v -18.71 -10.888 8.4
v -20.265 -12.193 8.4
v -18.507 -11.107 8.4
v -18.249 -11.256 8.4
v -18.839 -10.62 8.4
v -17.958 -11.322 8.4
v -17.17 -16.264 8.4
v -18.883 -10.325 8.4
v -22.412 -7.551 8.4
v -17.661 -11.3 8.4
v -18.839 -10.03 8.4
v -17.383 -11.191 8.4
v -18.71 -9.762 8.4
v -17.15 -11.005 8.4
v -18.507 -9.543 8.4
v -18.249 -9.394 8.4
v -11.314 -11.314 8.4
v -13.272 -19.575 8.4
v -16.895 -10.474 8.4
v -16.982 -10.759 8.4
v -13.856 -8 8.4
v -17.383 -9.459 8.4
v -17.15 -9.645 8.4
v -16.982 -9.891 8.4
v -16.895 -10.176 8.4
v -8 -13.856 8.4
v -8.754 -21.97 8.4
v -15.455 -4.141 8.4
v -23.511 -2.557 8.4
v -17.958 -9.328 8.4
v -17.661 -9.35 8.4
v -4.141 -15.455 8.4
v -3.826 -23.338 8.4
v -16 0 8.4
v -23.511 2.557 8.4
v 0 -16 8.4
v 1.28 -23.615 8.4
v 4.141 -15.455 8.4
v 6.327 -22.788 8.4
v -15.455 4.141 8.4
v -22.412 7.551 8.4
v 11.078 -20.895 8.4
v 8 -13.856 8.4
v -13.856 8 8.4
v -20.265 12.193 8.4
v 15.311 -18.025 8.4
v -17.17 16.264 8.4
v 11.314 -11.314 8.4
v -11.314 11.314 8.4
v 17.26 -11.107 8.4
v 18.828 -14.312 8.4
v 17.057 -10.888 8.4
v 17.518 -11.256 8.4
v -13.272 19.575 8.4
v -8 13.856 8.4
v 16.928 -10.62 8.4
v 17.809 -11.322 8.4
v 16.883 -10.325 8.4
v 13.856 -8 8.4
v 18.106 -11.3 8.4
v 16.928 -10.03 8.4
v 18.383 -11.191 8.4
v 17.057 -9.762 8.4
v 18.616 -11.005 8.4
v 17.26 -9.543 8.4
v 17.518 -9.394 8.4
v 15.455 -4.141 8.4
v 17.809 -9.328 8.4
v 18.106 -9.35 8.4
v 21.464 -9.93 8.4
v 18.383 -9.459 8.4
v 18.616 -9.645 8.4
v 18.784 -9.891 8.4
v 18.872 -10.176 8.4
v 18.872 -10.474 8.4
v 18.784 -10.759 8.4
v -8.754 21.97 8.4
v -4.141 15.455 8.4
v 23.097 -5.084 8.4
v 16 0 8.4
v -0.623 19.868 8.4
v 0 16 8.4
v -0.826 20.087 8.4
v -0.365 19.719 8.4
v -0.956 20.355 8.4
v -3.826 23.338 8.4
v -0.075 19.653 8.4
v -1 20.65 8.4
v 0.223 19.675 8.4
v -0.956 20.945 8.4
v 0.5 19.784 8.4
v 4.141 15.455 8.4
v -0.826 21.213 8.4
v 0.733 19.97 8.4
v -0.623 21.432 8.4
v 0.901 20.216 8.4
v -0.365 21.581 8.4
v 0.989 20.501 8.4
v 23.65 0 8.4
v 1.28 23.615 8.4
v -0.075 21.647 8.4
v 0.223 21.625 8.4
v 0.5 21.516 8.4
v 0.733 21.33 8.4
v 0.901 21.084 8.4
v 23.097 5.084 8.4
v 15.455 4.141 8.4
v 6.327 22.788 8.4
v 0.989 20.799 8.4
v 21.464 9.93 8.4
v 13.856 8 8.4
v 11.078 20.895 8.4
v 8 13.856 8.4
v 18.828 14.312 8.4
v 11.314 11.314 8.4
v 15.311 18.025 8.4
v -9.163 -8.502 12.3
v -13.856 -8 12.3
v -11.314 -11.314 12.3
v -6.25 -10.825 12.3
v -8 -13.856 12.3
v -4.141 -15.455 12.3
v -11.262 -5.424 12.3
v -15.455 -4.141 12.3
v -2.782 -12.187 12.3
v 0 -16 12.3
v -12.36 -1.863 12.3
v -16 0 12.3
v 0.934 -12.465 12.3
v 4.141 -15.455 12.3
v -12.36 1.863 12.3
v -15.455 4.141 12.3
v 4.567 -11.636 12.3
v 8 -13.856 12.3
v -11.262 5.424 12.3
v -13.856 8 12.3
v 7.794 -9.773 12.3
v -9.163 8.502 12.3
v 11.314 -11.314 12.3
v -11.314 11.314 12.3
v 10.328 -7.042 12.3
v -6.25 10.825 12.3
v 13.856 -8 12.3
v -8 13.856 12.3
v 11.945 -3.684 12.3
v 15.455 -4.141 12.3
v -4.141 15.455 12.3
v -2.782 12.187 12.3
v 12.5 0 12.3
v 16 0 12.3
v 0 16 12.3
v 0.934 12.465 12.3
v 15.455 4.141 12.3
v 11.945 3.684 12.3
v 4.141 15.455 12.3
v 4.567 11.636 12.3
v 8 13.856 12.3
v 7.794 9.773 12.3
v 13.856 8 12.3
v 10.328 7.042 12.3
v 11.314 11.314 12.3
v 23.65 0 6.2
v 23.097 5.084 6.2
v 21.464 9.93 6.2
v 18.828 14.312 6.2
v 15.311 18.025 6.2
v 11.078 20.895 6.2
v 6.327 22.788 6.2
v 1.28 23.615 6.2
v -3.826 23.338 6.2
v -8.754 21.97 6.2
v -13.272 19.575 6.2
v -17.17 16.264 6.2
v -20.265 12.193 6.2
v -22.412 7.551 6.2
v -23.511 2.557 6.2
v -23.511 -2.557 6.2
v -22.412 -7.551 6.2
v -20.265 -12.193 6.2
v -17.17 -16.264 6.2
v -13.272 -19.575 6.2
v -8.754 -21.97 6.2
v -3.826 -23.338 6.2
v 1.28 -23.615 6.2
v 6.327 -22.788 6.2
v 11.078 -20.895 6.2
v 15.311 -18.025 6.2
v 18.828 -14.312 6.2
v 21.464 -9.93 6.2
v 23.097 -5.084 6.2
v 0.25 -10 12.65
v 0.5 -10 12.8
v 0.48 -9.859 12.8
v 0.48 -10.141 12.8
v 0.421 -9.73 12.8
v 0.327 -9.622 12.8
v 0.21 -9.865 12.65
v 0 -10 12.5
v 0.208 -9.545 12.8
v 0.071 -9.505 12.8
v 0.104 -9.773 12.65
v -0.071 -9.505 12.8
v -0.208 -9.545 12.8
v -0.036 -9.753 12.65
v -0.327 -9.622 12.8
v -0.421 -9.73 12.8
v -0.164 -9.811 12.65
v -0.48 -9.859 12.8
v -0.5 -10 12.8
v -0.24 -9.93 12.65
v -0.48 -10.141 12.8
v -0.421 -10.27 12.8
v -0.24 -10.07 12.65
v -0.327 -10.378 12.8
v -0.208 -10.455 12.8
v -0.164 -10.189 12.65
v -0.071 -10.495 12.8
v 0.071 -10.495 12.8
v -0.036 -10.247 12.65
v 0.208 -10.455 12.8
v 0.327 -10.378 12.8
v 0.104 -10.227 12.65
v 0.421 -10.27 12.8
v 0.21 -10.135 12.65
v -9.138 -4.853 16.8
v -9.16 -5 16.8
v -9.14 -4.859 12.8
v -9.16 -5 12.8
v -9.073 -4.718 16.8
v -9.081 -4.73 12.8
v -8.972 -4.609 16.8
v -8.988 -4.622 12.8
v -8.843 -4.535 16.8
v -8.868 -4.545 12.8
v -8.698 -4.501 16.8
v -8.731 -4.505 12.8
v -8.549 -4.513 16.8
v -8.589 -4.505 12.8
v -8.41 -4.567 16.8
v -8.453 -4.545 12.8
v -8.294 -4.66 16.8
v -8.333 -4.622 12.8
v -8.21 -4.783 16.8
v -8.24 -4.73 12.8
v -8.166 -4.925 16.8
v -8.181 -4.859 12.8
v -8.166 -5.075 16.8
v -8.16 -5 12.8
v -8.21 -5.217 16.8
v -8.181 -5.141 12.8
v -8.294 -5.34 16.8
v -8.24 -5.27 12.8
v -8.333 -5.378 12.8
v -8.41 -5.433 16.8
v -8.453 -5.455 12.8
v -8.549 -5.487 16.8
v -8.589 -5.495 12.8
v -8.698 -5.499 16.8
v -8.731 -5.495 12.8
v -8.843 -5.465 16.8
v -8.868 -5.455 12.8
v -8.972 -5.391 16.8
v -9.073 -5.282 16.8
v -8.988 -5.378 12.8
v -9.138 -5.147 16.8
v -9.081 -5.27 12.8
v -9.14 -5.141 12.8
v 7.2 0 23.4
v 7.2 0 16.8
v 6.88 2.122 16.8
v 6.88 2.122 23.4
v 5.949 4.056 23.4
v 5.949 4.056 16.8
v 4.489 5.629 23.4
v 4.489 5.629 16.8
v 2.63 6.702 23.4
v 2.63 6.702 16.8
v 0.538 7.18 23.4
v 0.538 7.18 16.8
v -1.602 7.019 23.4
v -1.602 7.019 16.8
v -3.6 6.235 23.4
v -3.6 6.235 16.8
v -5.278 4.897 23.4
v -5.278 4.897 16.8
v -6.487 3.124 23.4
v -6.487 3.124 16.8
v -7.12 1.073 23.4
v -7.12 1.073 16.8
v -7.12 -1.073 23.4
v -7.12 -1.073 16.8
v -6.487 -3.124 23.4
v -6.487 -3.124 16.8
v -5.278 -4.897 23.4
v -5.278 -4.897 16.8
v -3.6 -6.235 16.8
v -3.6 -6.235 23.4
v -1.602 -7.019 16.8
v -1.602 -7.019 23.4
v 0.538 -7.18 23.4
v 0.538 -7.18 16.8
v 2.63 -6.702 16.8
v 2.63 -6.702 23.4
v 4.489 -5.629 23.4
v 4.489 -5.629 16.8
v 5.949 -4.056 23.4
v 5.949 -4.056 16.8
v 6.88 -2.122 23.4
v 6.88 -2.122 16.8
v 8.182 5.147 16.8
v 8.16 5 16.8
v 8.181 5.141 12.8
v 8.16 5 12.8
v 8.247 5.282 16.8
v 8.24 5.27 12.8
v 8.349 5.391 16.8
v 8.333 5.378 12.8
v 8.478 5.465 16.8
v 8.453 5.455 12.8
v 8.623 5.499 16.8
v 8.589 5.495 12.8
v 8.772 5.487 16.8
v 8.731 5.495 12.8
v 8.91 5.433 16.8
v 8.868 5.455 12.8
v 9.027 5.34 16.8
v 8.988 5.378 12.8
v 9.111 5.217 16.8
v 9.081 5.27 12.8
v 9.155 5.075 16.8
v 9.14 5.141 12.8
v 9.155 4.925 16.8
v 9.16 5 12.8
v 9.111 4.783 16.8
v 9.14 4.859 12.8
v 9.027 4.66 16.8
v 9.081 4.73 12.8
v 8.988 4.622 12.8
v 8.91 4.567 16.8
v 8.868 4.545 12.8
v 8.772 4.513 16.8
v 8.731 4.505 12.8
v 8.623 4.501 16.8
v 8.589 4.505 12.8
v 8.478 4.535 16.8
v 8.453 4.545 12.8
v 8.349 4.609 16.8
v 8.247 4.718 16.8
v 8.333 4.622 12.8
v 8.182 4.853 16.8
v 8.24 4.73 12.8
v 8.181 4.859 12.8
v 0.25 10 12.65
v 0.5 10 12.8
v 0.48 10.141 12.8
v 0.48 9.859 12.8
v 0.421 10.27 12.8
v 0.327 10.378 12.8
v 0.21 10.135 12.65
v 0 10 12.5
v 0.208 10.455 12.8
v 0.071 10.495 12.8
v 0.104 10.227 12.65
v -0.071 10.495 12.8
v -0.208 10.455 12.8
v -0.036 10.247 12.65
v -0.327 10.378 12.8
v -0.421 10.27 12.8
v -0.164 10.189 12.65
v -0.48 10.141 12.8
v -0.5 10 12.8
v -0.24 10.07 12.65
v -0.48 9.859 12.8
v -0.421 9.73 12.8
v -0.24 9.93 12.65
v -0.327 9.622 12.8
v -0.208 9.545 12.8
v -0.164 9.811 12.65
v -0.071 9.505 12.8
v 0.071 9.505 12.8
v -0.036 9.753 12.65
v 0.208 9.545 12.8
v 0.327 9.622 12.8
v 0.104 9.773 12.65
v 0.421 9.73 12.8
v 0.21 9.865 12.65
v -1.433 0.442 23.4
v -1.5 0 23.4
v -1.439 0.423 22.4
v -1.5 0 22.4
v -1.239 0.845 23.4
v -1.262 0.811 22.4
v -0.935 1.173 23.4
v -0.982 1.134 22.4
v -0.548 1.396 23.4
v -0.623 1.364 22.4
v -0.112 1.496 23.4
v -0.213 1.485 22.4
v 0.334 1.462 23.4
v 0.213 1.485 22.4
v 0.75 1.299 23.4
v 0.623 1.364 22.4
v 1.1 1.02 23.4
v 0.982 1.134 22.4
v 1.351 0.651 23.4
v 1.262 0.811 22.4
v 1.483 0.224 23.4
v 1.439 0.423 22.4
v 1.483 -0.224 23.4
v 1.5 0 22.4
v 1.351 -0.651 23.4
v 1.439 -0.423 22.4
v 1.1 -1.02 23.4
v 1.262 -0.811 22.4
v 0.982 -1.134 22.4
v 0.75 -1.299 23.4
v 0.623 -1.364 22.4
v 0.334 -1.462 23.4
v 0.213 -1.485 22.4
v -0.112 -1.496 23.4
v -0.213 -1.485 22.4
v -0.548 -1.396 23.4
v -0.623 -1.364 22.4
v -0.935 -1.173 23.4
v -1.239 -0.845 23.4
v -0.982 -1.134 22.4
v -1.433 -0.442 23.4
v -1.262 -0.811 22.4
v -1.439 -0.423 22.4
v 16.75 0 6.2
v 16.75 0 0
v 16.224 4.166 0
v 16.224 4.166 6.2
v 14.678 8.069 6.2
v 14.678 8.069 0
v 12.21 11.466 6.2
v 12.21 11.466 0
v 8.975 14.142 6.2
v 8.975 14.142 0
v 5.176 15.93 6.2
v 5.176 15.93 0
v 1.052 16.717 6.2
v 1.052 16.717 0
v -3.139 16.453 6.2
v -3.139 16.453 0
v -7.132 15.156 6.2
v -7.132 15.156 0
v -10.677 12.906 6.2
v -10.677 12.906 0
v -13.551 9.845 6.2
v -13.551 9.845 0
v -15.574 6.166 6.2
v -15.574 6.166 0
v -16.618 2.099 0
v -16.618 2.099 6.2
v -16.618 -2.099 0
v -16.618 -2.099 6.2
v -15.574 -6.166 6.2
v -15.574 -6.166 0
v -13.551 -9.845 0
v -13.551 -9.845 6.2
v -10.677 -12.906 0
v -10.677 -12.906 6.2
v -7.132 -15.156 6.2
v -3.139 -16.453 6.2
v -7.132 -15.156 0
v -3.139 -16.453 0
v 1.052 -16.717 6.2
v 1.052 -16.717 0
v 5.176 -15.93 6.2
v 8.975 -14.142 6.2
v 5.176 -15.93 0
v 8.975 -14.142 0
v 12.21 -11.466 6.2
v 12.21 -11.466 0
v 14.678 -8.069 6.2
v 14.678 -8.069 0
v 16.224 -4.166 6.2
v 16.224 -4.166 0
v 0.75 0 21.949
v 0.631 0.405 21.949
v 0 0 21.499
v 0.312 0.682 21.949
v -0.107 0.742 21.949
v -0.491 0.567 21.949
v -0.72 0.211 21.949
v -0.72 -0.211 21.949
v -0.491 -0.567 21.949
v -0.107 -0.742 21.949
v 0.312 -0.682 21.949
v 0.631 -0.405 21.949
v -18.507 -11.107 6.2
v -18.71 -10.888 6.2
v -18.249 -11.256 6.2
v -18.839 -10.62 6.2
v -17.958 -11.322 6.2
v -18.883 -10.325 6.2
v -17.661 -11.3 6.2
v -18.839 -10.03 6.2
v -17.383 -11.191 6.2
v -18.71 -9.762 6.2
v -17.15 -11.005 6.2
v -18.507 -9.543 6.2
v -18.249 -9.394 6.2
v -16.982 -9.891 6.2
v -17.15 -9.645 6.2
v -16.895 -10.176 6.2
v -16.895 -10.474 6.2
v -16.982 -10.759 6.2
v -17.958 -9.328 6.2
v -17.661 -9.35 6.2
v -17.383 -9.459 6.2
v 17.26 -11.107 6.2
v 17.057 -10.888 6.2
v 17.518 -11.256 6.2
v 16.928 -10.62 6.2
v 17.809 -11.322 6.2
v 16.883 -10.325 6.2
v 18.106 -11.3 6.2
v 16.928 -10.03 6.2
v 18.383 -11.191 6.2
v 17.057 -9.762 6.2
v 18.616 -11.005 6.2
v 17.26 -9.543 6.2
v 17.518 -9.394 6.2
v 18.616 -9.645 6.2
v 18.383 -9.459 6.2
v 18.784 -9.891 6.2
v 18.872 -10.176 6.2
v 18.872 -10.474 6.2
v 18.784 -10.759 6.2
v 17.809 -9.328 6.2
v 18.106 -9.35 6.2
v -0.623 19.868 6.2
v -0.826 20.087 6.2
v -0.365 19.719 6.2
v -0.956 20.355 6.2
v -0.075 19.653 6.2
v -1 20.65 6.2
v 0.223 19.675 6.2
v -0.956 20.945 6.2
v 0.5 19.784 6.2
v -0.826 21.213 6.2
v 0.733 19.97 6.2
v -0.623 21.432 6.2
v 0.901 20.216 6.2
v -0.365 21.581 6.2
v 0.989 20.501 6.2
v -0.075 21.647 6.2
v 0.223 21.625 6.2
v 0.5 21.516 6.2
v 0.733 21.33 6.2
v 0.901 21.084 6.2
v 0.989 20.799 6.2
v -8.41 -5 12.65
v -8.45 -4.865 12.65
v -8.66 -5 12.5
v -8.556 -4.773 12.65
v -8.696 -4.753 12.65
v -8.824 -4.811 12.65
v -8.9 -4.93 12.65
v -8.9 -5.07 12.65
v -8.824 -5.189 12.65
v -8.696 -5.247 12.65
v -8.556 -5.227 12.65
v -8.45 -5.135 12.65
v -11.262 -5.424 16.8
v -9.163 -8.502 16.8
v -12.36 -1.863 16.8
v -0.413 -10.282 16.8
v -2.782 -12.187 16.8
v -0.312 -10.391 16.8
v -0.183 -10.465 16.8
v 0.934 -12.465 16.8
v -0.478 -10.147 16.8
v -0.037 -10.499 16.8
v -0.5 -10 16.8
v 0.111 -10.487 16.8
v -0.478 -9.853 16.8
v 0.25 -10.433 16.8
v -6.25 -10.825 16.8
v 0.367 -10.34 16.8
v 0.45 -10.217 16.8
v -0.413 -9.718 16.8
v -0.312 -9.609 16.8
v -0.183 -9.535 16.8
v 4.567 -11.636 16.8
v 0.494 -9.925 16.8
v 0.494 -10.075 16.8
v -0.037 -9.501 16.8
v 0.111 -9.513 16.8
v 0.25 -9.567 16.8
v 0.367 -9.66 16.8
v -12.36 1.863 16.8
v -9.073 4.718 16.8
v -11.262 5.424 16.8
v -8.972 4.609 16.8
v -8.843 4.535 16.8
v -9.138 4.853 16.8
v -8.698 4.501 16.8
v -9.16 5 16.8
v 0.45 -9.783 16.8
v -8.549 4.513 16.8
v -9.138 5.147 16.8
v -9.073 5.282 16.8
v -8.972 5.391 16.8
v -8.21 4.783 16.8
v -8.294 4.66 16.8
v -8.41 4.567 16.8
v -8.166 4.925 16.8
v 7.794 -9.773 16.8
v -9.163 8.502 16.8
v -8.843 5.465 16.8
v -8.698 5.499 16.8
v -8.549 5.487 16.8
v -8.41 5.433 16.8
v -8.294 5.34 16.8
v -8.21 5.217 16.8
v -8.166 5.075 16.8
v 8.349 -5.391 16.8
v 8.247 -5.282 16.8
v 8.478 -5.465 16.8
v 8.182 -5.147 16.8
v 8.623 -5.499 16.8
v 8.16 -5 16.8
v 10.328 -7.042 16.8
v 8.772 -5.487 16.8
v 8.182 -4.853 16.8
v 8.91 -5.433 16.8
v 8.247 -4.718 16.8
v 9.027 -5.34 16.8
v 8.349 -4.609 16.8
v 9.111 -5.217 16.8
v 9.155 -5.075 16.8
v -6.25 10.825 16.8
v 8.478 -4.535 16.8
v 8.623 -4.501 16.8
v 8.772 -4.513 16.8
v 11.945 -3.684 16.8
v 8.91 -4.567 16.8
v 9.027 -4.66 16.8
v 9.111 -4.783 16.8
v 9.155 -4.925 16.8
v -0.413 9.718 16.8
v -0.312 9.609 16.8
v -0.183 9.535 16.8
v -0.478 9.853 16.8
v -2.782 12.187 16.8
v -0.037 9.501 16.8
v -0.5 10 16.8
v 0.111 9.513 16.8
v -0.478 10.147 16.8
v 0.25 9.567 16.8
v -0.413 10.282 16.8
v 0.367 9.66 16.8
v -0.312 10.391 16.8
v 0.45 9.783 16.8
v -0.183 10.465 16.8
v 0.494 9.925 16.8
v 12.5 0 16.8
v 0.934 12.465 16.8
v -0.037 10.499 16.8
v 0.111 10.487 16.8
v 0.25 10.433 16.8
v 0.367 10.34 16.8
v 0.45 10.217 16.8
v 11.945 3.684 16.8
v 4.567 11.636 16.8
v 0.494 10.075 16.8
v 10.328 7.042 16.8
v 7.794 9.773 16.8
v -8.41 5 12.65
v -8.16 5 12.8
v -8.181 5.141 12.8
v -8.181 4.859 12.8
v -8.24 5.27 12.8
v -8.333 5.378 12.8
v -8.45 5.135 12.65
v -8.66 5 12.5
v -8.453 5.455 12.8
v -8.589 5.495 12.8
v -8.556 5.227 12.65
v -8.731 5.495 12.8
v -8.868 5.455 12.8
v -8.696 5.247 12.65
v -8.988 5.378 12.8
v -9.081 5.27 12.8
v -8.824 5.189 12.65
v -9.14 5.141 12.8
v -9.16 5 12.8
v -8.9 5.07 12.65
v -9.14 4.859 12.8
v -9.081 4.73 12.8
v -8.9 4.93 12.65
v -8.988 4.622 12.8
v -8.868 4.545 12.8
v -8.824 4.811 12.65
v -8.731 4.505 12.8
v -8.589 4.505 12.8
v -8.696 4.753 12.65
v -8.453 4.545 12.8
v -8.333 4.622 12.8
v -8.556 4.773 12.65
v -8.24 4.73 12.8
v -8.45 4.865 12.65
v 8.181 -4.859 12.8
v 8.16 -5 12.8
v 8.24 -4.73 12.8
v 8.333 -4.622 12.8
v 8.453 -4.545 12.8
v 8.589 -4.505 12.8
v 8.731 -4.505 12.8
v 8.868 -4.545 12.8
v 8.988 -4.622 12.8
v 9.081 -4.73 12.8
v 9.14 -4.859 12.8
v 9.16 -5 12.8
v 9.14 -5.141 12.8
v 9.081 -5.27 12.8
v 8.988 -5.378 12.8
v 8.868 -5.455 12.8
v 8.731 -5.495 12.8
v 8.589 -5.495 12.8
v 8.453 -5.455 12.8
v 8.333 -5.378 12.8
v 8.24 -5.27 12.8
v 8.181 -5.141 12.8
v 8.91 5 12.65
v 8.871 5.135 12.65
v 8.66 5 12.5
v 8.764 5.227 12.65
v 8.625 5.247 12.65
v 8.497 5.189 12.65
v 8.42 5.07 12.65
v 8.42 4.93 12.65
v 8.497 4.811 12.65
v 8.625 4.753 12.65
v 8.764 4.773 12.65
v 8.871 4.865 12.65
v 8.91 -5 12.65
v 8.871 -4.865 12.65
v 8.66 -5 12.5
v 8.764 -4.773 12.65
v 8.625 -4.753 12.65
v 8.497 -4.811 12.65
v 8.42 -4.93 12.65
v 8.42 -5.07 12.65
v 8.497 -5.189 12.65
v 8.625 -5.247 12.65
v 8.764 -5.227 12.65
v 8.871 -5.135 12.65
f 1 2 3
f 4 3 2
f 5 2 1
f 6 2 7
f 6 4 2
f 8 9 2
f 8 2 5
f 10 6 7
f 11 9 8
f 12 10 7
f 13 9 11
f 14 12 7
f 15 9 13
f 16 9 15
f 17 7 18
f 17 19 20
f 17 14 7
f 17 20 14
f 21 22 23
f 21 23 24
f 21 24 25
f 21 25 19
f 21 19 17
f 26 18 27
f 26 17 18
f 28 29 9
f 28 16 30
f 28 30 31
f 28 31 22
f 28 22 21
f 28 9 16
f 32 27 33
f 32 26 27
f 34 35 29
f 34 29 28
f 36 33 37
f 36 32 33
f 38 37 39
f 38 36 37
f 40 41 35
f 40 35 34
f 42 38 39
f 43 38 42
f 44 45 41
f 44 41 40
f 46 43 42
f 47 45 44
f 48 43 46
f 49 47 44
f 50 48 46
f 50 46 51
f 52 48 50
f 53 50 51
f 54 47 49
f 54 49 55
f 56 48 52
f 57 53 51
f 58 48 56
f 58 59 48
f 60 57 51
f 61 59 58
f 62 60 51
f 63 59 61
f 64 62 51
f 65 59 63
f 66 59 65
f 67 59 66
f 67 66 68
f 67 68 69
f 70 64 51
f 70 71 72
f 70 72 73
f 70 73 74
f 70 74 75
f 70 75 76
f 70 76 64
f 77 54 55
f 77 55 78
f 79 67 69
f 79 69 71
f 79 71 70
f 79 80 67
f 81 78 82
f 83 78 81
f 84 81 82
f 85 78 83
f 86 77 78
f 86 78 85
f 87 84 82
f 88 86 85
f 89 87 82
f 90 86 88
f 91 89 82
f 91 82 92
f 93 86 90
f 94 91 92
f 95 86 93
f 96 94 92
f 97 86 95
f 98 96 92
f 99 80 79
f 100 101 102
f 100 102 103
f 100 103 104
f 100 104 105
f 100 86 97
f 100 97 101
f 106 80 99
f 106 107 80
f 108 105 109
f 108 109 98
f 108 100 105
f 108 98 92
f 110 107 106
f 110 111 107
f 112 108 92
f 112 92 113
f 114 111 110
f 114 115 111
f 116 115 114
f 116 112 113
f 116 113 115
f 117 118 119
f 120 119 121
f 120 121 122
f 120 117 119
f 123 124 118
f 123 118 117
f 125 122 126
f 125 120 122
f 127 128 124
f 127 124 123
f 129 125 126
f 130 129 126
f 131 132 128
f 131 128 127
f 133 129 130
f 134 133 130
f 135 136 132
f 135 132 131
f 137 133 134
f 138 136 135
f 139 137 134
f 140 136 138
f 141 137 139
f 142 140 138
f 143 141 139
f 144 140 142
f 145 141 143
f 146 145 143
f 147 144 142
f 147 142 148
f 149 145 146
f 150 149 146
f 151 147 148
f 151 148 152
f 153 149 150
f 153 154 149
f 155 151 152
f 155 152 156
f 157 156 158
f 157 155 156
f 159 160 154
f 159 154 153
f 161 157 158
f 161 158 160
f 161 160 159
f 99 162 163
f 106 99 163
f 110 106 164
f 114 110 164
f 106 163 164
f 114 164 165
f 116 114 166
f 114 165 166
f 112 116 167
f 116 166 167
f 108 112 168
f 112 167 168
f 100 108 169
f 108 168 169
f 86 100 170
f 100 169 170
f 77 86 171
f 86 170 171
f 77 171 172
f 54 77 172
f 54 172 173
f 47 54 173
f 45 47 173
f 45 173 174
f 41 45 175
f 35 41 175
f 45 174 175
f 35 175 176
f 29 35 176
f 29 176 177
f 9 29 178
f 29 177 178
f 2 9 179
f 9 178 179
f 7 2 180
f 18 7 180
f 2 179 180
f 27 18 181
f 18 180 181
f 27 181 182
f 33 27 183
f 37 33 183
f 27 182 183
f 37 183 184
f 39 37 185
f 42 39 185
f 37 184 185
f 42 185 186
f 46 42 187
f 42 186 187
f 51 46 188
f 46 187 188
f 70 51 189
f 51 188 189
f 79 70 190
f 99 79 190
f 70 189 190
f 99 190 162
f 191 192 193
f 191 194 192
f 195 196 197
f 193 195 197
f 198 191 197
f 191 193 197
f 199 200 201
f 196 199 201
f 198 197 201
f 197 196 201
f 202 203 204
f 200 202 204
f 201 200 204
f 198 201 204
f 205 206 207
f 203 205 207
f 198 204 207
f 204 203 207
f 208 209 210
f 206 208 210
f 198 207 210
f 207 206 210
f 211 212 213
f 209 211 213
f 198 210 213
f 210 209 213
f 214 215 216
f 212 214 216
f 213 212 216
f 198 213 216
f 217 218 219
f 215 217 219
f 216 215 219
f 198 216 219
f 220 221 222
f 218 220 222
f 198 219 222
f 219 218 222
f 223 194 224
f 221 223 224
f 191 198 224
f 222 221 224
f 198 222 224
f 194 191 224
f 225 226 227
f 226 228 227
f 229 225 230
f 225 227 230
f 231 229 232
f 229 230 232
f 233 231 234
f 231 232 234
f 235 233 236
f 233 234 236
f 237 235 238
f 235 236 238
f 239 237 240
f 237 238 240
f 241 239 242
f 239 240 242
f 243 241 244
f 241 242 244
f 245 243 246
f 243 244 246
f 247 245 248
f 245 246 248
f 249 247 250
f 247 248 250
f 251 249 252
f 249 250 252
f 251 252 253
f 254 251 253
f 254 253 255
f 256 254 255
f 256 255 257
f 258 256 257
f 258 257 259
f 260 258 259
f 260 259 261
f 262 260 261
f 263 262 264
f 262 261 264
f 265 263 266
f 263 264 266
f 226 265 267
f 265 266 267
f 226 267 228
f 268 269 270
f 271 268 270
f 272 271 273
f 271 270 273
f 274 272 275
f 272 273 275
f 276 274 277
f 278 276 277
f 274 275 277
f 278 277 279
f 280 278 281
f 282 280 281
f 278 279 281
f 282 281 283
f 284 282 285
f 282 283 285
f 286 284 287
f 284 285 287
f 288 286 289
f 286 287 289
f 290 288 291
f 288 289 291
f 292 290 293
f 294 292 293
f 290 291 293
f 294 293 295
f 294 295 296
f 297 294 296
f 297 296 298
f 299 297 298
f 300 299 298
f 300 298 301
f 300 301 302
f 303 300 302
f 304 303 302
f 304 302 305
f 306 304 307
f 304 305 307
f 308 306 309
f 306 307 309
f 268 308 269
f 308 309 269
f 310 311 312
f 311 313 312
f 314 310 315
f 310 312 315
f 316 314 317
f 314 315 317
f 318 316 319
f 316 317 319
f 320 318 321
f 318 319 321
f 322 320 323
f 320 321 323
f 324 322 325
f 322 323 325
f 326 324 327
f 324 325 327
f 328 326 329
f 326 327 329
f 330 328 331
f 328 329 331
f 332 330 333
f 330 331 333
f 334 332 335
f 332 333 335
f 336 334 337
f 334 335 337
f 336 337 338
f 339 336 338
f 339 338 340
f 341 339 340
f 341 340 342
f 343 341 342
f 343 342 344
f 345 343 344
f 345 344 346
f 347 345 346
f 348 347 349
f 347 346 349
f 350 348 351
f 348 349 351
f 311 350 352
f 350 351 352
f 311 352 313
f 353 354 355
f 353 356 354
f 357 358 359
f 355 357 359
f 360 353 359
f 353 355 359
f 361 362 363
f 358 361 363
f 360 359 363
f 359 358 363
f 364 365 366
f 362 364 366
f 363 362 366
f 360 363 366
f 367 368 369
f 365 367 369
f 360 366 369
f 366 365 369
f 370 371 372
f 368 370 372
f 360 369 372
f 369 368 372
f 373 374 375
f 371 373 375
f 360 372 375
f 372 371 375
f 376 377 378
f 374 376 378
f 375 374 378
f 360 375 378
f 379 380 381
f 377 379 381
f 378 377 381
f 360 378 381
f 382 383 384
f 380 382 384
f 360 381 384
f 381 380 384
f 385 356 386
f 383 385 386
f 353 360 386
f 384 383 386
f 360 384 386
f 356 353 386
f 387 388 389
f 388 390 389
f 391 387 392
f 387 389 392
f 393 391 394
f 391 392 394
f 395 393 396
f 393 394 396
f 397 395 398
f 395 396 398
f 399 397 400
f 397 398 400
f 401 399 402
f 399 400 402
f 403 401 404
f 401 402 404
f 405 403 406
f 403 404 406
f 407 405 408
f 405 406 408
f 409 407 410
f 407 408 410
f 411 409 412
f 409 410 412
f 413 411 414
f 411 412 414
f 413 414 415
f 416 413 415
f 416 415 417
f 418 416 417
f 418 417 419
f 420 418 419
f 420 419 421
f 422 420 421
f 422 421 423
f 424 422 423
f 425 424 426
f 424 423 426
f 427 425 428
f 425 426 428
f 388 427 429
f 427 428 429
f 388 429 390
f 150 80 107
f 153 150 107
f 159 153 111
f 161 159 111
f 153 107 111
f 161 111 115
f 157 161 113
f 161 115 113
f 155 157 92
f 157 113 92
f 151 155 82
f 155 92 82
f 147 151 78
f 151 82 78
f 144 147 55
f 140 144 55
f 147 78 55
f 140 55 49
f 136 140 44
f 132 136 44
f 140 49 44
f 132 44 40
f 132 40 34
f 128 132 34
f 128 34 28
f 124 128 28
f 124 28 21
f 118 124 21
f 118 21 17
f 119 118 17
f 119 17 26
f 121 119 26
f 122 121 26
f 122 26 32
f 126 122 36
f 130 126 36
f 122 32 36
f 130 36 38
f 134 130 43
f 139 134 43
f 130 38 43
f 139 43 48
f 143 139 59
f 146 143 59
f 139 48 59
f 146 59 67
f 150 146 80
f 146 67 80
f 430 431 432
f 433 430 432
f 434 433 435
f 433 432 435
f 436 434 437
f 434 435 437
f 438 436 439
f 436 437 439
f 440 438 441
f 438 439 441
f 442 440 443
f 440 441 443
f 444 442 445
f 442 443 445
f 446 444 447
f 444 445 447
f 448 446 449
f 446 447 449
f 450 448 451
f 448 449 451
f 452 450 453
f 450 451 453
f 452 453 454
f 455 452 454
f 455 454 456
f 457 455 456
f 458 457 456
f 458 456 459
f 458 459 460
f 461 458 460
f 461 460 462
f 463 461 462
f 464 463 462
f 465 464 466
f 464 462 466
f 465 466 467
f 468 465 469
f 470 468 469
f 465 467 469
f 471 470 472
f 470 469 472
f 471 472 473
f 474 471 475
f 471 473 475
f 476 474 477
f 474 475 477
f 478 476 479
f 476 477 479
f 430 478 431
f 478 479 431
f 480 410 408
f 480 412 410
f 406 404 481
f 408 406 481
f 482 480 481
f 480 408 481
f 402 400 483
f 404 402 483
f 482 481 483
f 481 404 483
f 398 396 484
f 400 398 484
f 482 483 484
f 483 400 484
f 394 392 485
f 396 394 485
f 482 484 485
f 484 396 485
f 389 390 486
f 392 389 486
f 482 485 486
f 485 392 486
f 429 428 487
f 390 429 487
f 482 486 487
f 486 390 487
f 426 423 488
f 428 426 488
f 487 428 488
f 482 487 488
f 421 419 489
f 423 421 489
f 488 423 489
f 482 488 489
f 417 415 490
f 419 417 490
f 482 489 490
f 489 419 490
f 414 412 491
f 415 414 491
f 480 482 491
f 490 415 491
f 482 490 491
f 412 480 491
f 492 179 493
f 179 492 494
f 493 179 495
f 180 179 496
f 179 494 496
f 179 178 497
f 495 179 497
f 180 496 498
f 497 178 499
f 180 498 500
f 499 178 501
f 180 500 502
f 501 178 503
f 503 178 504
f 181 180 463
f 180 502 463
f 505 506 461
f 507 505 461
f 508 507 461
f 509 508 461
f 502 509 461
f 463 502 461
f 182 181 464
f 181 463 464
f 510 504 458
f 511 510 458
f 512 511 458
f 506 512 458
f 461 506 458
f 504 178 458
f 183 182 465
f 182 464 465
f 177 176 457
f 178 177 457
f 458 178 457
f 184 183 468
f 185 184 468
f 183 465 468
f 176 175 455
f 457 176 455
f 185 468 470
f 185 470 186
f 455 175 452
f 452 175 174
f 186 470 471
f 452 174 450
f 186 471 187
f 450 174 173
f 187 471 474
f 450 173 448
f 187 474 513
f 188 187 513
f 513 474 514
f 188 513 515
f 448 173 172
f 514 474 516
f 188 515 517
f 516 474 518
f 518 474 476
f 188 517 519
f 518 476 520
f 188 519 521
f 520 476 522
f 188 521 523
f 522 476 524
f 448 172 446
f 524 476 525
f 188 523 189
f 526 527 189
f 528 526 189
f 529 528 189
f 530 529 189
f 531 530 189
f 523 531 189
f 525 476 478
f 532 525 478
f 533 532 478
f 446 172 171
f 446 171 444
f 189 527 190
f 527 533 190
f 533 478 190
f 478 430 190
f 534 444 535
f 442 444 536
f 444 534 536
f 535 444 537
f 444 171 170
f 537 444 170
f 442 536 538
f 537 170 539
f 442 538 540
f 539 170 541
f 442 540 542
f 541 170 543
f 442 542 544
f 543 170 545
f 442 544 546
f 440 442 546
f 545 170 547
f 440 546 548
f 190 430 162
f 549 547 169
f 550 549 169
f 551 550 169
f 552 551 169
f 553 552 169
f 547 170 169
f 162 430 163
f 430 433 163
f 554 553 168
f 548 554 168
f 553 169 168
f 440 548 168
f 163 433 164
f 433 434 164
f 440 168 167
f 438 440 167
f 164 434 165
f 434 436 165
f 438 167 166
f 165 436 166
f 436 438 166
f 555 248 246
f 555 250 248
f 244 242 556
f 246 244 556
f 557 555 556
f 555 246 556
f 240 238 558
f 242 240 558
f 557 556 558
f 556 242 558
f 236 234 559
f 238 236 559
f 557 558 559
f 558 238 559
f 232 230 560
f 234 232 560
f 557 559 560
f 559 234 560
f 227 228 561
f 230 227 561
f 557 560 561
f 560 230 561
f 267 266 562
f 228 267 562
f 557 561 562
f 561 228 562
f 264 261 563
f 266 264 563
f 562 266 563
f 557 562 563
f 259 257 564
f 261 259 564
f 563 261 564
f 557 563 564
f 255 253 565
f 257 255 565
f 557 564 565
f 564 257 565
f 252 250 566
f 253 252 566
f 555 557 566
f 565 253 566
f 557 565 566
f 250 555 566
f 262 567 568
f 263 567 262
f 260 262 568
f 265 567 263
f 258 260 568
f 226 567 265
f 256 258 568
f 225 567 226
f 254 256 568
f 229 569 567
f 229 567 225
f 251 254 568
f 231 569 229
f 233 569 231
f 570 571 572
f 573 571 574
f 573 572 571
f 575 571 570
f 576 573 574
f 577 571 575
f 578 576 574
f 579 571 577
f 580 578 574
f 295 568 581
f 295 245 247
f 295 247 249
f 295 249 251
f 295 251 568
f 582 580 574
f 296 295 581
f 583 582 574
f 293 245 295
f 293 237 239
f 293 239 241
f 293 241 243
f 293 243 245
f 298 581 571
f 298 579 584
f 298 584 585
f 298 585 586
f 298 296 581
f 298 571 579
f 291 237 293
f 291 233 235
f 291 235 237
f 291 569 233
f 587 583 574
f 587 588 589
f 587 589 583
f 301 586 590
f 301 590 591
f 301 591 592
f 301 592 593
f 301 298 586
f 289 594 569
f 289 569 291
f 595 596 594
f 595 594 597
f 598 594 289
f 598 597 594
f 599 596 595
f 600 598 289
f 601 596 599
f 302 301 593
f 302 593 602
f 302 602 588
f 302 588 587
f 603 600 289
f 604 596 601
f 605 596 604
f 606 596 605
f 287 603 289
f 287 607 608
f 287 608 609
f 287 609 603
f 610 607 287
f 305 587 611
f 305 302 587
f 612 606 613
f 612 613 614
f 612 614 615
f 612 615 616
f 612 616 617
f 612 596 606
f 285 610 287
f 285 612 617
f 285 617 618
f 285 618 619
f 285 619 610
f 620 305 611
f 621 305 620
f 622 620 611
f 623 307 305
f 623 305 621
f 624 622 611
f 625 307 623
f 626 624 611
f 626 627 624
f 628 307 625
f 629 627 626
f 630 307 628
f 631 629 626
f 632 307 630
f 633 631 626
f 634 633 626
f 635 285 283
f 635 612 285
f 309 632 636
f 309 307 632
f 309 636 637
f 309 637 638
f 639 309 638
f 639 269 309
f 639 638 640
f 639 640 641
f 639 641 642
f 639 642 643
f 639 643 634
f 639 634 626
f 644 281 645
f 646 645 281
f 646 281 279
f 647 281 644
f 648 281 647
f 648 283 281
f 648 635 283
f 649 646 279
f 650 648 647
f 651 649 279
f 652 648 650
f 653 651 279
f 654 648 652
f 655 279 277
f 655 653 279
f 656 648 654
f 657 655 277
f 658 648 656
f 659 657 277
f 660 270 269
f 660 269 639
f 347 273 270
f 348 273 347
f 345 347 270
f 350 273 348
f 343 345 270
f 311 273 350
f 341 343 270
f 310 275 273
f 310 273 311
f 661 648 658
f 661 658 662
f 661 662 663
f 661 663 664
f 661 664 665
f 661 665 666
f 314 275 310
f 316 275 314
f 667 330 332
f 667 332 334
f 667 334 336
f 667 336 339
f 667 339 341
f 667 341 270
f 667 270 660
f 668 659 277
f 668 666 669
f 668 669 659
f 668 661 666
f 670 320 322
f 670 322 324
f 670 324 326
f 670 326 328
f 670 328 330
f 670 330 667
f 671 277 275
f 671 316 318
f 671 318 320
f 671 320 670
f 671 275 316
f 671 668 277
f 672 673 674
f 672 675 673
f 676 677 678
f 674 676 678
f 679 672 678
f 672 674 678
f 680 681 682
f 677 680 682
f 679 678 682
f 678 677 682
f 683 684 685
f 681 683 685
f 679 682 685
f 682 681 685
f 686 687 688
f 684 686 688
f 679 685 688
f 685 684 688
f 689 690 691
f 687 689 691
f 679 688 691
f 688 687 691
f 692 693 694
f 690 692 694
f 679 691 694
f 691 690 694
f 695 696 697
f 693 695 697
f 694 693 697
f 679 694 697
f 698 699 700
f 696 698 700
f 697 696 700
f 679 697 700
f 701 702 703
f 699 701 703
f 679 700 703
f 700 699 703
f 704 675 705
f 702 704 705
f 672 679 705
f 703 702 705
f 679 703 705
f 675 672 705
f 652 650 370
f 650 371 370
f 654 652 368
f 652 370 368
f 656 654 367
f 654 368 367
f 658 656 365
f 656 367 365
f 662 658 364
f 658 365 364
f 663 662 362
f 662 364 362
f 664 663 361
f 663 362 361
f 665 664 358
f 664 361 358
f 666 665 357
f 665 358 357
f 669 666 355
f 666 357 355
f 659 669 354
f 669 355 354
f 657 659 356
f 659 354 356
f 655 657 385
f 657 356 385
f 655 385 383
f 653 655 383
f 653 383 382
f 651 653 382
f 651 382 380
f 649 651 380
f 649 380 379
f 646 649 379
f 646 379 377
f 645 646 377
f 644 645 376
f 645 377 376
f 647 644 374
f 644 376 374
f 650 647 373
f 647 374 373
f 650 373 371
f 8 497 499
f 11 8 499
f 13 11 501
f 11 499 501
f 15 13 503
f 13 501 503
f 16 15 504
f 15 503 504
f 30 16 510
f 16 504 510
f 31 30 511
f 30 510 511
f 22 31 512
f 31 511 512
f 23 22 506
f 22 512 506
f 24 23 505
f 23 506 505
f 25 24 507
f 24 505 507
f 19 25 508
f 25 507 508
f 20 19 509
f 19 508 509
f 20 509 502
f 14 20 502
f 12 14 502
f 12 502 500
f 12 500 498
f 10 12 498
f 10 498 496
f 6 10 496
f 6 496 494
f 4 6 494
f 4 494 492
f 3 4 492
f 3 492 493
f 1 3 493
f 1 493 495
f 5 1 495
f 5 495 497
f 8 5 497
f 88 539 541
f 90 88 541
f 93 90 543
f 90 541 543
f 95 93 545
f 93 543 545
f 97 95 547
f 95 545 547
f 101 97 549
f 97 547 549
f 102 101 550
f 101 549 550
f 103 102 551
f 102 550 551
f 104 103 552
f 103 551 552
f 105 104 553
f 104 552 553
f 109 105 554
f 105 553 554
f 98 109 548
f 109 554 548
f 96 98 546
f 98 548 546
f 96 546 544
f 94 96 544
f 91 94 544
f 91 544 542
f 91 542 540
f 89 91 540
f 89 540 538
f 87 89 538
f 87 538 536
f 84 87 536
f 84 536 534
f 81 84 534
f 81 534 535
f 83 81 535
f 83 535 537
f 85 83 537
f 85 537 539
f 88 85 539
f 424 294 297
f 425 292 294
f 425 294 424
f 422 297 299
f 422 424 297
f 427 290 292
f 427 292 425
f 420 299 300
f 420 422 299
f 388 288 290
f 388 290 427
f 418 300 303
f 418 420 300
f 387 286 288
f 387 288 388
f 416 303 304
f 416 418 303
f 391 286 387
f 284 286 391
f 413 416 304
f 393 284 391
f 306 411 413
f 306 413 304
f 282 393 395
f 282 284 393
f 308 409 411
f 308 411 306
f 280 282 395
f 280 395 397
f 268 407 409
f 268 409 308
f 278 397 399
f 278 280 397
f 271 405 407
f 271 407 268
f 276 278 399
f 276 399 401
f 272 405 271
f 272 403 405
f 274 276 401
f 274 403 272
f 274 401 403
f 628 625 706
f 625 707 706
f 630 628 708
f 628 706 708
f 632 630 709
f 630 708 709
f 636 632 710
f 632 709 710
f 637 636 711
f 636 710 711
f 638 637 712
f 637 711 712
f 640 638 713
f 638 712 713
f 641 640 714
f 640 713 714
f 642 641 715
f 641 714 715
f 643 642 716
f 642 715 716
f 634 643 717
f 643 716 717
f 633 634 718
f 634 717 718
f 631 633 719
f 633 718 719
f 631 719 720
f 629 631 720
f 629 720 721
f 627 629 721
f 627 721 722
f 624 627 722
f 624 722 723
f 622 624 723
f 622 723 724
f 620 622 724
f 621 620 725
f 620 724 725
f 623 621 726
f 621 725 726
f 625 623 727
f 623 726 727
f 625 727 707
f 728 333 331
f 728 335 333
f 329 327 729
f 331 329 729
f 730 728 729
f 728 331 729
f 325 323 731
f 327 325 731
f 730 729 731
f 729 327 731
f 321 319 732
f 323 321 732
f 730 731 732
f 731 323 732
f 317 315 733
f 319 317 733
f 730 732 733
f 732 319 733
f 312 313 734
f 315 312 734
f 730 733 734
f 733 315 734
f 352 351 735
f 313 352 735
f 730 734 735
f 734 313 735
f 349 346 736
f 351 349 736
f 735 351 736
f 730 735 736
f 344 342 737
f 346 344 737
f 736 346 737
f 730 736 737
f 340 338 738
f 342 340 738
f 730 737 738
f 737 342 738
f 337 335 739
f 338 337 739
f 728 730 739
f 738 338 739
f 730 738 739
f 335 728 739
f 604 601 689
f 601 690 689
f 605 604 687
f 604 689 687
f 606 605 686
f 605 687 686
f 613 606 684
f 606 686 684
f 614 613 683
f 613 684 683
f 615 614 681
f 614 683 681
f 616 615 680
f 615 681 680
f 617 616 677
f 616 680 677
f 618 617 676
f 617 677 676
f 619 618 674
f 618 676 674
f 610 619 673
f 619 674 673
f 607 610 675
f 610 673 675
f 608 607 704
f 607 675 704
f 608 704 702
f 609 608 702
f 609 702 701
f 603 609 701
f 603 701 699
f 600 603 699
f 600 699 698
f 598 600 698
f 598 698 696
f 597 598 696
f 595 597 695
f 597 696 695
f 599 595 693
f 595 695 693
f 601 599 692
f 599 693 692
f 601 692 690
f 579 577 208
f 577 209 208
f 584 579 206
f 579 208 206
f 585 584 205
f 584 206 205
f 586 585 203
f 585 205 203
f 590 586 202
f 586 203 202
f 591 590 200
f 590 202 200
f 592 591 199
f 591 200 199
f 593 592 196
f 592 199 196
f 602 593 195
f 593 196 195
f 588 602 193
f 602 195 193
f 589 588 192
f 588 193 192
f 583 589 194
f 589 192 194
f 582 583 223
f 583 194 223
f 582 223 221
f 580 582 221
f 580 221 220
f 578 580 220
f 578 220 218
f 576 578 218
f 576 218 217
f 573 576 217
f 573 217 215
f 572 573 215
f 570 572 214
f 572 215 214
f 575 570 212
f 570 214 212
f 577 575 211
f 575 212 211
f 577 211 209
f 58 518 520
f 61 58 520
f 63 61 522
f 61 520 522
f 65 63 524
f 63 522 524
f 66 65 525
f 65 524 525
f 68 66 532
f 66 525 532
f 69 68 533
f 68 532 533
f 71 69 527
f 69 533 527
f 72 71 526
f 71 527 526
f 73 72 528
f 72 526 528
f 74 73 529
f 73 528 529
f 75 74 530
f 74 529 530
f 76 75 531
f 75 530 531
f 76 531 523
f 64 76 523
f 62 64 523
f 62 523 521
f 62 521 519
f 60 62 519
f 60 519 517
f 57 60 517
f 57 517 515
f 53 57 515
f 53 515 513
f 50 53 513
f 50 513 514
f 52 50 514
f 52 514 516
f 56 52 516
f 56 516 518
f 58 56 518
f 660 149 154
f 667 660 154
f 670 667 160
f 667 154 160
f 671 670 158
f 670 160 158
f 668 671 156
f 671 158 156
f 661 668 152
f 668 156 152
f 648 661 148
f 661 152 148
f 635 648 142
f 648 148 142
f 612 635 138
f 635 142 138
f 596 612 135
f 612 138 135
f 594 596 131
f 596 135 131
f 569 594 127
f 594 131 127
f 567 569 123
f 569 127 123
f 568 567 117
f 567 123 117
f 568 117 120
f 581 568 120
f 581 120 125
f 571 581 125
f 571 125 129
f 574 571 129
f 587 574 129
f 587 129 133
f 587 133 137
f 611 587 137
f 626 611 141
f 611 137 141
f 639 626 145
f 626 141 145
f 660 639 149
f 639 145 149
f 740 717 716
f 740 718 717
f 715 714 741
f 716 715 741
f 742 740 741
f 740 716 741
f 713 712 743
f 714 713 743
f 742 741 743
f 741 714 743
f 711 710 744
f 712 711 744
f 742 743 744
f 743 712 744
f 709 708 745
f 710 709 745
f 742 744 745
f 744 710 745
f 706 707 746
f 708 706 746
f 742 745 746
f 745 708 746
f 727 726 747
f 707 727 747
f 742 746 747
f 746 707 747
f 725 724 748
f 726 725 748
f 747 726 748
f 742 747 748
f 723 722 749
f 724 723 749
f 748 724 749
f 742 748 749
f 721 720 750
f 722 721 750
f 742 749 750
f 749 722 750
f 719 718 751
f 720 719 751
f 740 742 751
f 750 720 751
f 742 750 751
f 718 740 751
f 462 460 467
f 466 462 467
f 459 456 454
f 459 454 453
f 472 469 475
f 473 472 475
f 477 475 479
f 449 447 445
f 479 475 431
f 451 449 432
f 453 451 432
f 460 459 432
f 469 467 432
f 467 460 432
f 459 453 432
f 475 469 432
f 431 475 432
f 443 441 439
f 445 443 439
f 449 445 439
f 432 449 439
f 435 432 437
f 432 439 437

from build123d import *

# Parameters (mm, degrees)
F0_R      = 16.75
F1_DEPTH  = 6.2
F2_R      = 23.65
F3_DEPTH  = 2.2
F5_D      = 2
F6_R      = 16
F7_DEPTH  = 3.9
F8_R      = 12.5
F9_DEPTH  = 4.5
F11_D     = 1
F11_DEPTH = 4
F11_TIP   = 0.3004303095
F12_R     = 7.2
F13_DEPTH = 6.6
F15_D     = 3
F15_DEPTH = 1
F15_TIP   = 0.9012909285


with BuildPart() as f1:
    # F0 (on Top) → F1 (new body)
    with BuildSketch(Plane.XY):
        Circle(F0_R)
    extrude(amount=F1_DEPTH)

    # F2 (on face) → F3 (join)
    with BuildSketch(Plane.XY.offset(6.2)):
        Circle(F2_R)
    extrude(amount=F3_DEPTH)

    # F5 (through all)
    with Locations(Plane.XY.offset(8.4)):
        with Locations((0, 20.65), (17.8834245881, -10.325), (-17.8834245881, -10.325)):
            Hole(F5_D / 2)

    # F6 (on face) → F7 (join)
    with BuildSketch(Plane.XY.offset(8.4)):
        Circle(F6_R)
    extrude(amount=F7_DEPTH)

    # F8 (on face) → F9 (join)
    with BuildSketch(Plane.XY.offset(12.3)):
        Circle(F8_R)
    extrude(amount=F9_DEPTH)

    # F11
    with Locations(Plane.XY.offset(16.8)):
        with Locations((-8.6602540378, 5), (0, 10), (8.6602540378, 5), (8.6602540378, -5), (0, -10), (-8.6602540378, -5)):
            Hole(F11_D / 2, depth=F11_DEPTH)
            with Locations((0, 0, -(F11_DEPTH + F11_TIP / 2))):  # 118° drill point
                Cone(0, F11_D / 2, F11_TIP, mode=Mode.SUBTRACT)

    # F12 (on face) → F13 (join)
    with BuildSketch(Plane.XY.offset(16.8)):
        Circle(F12_R)
    extrude(amount=F13_DEPTH)

    # F15
    with Locations(Plane.XY.offset(23.4)):
        with Locations((0, 0)):
            Hole(F15_D / 2, depth=F15_DEPTH)
            with Locations((0, 0, -(F15_DEPTH + F15_TIP / 2))):  # 118° drill point
                Cone(0, F15_D / 2, F15_TIP, mode=Mode.SUBTRACT)


solid = f1.part
